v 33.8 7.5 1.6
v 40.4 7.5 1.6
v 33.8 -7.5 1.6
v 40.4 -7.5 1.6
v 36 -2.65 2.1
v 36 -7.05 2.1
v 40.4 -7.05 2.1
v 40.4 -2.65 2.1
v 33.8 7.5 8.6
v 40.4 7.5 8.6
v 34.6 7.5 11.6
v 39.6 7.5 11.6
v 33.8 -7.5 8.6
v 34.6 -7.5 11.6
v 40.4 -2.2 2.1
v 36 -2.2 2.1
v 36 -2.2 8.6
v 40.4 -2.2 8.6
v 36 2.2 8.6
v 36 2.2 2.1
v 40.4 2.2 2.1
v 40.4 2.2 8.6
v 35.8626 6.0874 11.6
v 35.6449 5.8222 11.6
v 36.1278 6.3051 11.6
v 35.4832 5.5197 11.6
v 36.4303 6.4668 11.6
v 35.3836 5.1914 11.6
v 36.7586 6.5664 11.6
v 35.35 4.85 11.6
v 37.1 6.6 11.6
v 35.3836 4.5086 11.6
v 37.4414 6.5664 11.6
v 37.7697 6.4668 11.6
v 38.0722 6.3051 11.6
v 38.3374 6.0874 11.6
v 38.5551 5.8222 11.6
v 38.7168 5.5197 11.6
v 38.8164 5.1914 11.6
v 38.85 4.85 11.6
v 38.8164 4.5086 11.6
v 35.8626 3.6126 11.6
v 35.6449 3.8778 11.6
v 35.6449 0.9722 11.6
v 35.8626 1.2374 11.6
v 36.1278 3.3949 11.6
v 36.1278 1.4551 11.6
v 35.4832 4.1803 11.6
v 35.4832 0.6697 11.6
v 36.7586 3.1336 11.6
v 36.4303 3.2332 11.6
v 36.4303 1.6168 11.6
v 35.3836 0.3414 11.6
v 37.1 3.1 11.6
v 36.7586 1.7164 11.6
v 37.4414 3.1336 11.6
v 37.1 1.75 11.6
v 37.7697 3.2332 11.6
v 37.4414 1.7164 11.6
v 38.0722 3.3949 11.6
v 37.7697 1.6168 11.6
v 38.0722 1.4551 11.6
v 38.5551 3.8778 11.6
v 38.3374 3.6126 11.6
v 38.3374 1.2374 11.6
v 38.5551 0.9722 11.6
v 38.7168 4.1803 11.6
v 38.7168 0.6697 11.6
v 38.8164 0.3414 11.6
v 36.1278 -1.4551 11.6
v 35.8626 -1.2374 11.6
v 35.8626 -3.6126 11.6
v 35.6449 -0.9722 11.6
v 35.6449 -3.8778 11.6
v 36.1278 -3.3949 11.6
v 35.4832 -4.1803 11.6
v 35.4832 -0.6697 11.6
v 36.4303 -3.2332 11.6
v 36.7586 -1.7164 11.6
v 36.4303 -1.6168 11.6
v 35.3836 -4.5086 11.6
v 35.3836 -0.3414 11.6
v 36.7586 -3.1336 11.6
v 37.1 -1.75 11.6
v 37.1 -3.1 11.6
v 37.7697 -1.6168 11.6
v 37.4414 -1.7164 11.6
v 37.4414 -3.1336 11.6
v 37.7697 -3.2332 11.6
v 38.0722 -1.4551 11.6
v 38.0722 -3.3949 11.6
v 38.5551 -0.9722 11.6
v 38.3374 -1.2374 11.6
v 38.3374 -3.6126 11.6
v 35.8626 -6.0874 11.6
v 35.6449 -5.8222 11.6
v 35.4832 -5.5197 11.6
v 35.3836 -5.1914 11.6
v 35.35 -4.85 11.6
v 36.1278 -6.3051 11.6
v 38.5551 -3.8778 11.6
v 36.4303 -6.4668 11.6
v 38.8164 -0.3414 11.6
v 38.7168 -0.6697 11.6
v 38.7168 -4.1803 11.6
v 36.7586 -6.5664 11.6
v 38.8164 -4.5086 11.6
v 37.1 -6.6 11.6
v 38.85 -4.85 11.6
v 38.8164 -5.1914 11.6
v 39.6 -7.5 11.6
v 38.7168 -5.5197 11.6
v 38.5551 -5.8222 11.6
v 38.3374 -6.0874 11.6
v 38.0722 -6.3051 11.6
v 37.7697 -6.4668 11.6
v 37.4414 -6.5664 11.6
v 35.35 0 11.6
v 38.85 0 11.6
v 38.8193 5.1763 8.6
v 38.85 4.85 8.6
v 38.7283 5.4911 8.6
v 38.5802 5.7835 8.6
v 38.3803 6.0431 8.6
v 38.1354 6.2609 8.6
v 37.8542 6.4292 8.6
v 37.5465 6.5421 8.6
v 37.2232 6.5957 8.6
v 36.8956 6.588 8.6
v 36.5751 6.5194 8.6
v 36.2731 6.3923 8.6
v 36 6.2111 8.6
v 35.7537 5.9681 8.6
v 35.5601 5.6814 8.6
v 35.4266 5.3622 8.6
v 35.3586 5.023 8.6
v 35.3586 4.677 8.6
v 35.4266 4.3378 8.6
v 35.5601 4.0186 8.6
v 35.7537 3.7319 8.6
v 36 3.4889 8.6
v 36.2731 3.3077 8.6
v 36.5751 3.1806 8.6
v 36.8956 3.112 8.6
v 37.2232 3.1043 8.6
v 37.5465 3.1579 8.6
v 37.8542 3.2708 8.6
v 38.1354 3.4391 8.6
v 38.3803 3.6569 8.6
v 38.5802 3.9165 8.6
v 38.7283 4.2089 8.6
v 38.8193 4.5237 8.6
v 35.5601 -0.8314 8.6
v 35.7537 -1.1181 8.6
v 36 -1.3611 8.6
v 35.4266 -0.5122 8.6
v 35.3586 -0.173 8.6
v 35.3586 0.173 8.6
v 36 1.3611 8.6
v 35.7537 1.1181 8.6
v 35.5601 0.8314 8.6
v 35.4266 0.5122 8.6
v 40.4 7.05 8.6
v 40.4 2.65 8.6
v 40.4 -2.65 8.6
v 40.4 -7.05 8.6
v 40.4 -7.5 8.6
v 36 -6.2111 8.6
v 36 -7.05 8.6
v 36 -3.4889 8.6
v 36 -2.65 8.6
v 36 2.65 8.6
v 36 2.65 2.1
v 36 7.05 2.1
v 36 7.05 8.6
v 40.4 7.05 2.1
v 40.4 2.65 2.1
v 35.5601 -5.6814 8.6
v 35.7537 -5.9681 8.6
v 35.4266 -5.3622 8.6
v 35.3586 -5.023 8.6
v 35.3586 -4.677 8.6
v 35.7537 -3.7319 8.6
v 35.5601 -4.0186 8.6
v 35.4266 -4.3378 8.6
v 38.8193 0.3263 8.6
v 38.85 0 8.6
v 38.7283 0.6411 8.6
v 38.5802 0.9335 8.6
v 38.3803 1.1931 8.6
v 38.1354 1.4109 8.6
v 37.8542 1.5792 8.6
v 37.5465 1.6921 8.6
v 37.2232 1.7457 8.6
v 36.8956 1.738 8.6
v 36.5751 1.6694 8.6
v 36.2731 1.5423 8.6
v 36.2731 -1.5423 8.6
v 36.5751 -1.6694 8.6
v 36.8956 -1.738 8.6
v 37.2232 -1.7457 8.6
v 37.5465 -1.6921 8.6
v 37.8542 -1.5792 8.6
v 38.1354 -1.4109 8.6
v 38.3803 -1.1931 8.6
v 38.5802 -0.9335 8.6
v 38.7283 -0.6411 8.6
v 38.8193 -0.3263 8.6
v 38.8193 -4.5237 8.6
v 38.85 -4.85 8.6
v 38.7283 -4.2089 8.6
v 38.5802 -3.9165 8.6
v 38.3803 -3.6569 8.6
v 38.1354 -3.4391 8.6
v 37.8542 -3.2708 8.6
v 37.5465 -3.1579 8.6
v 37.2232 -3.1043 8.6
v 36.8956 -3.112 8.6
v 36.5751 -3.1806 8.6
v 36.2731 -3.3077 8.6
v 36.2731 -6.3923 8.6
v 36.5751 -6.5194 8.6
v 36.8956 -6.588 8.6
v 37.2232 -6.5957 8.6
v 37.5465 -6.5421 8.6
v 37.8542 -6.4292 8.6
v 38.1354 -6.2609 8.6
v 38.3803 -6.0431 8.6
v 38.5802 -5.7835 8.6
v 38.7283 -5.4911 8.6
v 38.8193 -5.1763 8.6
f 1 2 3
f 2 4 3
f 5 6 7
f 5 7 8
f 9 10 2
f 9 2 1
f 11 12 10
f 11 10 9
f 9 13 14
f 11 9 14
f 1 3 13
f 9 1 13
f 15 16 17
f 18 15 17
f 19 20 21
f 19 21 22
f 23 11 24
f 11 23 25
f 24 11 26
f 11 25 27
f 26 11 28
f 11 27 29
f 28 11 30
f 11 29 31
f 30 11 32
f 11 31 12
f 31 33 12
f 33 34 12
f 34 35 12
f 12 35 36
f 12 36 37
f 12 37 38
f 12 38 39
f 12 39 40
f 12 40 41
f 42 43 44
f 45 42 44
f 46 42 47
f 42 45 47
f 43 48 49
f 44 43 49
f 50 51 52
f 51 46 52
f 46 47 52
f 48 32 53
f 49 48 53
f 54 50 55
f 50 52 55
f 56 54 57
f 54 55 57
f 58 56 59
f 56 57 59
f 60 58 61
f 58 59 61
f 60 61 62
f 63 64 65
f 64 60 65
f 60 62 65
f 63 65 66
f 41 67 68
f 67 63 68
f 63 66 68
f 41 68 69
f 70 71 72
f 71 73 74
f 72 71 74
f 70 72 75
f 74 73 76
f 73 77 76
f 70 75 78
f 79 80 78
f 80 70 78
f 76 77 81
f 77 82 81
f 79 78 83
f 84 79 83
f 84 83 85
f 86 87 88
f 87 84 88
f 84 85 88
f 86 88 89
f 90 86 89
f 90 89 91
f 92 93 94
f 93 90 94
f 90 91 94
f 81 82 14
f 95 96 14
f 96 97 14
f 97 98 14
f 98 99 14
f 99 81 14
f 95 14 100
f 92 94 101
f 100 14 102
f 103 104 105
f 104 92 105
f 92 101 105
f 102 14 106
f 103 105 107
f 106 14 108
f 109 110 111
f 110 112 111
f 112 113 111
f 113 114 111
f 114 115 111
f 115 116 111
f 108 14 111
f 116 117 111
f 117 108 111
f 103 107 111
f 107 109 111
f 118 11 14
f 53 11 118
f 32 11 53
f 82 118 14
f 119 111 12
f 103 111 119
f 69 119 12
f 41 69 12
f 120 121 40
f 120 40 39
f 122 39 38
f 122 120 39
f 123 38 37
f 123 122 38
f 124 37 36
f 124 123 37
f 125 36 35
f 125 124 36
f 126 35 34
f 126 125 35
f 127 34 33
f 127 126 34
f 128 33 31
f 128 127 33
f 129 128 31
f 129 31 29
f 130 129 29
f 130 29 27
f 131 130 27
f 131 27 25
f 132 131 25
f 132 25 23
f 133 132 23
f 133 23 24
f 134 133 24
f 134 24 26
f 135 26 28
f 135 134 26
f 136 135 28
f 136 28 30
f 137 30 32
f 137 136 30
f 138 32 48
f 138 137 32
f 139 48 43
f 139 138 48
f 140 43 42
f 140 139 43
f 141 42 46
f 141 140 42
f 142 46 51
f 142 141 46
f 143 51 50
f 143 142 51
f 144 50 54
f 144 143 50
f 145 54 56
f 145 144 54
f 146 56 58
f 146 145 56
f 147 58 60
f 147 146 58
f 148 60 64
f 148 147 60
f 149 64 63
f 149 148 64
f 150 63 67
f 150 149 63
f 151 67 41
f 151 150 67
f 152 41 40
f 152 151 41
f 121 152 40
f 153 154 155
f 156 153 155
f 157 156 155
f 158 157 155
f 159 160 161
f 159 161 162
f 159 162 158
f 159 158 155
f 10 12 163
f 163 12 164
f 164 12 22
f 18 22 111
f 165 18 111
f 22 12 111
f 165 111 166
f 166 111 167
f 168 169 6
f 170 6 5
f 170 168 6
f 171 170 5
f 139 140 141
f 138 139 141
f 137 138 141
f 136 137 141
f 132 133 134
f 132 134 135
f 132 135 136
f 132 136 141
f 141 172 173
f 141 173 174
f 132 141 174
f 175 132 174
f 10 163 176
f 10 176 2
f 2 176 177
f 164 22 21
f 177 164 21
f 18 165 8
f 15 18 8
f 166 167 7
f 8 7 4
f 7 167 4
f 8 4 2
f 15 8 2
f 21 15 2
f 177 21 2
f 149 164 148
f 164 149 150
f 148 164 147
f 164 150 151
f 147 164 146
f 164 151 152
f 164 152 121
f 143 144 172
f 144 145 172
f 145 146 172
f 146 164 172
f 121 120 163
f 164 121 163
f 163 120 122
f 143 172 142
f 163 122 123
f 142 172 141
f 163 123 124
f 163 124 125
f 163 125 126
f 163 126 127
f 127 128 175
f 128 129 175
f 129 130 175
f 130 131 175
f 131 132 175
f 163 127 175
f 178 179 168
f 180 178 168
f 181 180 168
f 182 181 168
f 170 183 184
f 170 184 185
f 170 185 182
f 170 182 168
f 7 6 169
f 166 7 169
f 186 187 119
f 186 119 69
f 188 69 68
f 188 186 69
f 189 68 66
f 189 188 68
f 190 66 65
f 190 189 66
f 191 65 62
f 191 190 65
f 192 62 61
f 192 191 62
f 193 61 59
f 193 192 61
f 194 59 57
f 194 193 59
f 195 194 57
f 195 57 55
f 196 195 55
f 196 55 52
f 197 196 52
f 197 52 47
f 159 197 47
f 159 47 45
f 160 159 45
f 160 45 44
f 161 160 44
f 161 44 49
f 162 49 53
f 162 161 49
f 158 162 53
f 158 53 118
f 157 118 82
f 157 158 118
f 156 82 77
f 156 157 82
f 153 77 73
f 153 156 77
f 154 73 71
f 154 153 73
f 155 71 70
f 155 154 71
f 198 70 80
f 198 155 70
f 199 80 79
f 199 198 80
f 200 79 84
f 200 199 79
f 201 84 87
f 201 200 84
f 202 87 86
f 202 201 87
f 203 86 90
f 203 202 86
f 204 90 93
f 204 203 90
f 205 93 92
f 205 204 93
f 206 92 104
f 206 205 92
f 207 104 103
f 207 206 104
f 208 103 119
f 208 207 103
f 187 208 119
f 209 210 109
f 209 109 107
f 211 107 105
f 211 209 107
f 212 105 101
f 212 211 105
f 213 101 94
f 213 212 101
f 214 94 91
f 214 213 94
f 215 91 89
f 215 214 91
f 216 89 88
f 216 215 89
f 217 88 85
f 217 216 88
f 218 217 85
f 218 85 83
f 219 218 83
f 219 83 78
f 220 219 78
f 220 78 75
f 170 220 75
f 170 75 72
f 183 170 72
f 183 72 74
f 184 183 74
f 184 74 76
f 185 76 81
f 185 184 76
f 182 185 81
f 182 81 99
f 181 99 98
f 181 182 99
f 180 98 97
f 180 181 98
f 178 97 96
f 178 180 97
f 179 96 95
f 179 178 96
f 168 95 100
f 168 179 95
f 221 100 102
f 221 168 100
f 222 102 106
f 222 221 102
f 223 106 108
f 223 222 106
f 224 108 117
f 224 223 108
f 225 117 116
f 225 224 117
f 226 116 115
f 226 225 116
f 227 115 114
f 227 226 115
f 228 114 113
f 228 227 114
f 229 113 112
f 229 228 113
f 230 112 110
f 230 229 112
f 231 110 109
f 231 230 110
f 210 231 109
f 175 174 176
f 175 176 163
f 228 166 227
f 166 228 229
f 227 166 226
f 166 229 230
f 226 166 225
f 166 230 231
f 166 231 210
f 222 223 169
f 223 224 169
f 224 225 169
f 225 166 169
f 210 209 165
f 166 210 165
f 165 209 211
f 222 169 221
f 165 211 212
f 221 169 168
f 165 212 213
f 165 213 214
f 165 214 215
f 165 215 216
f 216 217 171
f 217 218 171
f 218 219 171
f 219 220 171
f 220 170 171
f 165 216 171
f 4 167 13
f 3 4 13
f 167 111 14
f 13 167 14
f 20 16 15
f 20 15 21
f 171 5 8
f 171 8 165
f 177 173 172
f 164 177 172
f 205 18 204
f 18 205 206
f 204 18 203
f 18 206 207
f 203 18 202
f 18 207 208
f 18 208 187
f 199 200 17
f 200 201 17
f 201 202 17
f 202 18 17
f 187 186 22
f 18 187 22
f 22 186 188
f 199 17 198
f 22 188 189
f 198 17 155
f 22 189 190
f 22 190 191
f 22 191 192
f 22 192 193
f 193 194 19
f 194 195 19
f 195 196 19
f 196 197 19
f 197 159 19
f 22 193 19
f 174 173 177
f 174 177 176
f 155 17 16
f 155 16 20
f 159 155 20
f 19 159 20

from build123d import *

# Parameters (mm, degrees)
PAD008_DEPTH    = 7.5
SKETCH012_W     = 4.4
SKETCH012_H     = 6.5
POCKET_DEPTH    = 4.401
SKETCH013_R     = 1.75
POCKET001_DEPTH = 3.001


with BuildPart() as part:
    # Sketch011 → Pad008 (new body, symmetric)
    with BuildSketch(Plane.XZ):
        Polygon((34.6, 11.6), (39.6, 11.6), (40.4, 8.6), (40.4, 1.6), (33.8, 1.6), (33.8, 8.6), align=None)
    extrude(amount=PAD008_DEPTH, both=True)

    # Sketch012 → Pocket (cut, through all)
    with BuildSketch(Plane.YZ.offset(36)):
        with Locations((-4.85, 5.35)):
            Rectangle(SKETCH012_W, SKETCH012_H)
        with Locations((0, 5.35)):
            Rectangle(SKETCH012_W, SKETCH012_H)
        with Locations((4.85, 5.35)):
            Rectangle(SKETCH012_W, SKETCH012_H)
    extrude(amount=POCKET_DEPTH, mode=Mode.SUBTRACT)

    # Sketch013 → Pocket001 (cut, through all)
    with BuildSketch(Plane.XY.offset(8.6)):
        with Locations((37.1, -4.85)):
            Circle(SKETCH013_R)
        with Locations((37.1, 4.85)):
            Circle(SKETCH013_R)
        with Locations((37.1, 0)):
            Circle(SKETCH013_R)
    extrude(amount=POCKET001_DEPTH, mode=Mode.SUBTRACT)


solid = part.part
